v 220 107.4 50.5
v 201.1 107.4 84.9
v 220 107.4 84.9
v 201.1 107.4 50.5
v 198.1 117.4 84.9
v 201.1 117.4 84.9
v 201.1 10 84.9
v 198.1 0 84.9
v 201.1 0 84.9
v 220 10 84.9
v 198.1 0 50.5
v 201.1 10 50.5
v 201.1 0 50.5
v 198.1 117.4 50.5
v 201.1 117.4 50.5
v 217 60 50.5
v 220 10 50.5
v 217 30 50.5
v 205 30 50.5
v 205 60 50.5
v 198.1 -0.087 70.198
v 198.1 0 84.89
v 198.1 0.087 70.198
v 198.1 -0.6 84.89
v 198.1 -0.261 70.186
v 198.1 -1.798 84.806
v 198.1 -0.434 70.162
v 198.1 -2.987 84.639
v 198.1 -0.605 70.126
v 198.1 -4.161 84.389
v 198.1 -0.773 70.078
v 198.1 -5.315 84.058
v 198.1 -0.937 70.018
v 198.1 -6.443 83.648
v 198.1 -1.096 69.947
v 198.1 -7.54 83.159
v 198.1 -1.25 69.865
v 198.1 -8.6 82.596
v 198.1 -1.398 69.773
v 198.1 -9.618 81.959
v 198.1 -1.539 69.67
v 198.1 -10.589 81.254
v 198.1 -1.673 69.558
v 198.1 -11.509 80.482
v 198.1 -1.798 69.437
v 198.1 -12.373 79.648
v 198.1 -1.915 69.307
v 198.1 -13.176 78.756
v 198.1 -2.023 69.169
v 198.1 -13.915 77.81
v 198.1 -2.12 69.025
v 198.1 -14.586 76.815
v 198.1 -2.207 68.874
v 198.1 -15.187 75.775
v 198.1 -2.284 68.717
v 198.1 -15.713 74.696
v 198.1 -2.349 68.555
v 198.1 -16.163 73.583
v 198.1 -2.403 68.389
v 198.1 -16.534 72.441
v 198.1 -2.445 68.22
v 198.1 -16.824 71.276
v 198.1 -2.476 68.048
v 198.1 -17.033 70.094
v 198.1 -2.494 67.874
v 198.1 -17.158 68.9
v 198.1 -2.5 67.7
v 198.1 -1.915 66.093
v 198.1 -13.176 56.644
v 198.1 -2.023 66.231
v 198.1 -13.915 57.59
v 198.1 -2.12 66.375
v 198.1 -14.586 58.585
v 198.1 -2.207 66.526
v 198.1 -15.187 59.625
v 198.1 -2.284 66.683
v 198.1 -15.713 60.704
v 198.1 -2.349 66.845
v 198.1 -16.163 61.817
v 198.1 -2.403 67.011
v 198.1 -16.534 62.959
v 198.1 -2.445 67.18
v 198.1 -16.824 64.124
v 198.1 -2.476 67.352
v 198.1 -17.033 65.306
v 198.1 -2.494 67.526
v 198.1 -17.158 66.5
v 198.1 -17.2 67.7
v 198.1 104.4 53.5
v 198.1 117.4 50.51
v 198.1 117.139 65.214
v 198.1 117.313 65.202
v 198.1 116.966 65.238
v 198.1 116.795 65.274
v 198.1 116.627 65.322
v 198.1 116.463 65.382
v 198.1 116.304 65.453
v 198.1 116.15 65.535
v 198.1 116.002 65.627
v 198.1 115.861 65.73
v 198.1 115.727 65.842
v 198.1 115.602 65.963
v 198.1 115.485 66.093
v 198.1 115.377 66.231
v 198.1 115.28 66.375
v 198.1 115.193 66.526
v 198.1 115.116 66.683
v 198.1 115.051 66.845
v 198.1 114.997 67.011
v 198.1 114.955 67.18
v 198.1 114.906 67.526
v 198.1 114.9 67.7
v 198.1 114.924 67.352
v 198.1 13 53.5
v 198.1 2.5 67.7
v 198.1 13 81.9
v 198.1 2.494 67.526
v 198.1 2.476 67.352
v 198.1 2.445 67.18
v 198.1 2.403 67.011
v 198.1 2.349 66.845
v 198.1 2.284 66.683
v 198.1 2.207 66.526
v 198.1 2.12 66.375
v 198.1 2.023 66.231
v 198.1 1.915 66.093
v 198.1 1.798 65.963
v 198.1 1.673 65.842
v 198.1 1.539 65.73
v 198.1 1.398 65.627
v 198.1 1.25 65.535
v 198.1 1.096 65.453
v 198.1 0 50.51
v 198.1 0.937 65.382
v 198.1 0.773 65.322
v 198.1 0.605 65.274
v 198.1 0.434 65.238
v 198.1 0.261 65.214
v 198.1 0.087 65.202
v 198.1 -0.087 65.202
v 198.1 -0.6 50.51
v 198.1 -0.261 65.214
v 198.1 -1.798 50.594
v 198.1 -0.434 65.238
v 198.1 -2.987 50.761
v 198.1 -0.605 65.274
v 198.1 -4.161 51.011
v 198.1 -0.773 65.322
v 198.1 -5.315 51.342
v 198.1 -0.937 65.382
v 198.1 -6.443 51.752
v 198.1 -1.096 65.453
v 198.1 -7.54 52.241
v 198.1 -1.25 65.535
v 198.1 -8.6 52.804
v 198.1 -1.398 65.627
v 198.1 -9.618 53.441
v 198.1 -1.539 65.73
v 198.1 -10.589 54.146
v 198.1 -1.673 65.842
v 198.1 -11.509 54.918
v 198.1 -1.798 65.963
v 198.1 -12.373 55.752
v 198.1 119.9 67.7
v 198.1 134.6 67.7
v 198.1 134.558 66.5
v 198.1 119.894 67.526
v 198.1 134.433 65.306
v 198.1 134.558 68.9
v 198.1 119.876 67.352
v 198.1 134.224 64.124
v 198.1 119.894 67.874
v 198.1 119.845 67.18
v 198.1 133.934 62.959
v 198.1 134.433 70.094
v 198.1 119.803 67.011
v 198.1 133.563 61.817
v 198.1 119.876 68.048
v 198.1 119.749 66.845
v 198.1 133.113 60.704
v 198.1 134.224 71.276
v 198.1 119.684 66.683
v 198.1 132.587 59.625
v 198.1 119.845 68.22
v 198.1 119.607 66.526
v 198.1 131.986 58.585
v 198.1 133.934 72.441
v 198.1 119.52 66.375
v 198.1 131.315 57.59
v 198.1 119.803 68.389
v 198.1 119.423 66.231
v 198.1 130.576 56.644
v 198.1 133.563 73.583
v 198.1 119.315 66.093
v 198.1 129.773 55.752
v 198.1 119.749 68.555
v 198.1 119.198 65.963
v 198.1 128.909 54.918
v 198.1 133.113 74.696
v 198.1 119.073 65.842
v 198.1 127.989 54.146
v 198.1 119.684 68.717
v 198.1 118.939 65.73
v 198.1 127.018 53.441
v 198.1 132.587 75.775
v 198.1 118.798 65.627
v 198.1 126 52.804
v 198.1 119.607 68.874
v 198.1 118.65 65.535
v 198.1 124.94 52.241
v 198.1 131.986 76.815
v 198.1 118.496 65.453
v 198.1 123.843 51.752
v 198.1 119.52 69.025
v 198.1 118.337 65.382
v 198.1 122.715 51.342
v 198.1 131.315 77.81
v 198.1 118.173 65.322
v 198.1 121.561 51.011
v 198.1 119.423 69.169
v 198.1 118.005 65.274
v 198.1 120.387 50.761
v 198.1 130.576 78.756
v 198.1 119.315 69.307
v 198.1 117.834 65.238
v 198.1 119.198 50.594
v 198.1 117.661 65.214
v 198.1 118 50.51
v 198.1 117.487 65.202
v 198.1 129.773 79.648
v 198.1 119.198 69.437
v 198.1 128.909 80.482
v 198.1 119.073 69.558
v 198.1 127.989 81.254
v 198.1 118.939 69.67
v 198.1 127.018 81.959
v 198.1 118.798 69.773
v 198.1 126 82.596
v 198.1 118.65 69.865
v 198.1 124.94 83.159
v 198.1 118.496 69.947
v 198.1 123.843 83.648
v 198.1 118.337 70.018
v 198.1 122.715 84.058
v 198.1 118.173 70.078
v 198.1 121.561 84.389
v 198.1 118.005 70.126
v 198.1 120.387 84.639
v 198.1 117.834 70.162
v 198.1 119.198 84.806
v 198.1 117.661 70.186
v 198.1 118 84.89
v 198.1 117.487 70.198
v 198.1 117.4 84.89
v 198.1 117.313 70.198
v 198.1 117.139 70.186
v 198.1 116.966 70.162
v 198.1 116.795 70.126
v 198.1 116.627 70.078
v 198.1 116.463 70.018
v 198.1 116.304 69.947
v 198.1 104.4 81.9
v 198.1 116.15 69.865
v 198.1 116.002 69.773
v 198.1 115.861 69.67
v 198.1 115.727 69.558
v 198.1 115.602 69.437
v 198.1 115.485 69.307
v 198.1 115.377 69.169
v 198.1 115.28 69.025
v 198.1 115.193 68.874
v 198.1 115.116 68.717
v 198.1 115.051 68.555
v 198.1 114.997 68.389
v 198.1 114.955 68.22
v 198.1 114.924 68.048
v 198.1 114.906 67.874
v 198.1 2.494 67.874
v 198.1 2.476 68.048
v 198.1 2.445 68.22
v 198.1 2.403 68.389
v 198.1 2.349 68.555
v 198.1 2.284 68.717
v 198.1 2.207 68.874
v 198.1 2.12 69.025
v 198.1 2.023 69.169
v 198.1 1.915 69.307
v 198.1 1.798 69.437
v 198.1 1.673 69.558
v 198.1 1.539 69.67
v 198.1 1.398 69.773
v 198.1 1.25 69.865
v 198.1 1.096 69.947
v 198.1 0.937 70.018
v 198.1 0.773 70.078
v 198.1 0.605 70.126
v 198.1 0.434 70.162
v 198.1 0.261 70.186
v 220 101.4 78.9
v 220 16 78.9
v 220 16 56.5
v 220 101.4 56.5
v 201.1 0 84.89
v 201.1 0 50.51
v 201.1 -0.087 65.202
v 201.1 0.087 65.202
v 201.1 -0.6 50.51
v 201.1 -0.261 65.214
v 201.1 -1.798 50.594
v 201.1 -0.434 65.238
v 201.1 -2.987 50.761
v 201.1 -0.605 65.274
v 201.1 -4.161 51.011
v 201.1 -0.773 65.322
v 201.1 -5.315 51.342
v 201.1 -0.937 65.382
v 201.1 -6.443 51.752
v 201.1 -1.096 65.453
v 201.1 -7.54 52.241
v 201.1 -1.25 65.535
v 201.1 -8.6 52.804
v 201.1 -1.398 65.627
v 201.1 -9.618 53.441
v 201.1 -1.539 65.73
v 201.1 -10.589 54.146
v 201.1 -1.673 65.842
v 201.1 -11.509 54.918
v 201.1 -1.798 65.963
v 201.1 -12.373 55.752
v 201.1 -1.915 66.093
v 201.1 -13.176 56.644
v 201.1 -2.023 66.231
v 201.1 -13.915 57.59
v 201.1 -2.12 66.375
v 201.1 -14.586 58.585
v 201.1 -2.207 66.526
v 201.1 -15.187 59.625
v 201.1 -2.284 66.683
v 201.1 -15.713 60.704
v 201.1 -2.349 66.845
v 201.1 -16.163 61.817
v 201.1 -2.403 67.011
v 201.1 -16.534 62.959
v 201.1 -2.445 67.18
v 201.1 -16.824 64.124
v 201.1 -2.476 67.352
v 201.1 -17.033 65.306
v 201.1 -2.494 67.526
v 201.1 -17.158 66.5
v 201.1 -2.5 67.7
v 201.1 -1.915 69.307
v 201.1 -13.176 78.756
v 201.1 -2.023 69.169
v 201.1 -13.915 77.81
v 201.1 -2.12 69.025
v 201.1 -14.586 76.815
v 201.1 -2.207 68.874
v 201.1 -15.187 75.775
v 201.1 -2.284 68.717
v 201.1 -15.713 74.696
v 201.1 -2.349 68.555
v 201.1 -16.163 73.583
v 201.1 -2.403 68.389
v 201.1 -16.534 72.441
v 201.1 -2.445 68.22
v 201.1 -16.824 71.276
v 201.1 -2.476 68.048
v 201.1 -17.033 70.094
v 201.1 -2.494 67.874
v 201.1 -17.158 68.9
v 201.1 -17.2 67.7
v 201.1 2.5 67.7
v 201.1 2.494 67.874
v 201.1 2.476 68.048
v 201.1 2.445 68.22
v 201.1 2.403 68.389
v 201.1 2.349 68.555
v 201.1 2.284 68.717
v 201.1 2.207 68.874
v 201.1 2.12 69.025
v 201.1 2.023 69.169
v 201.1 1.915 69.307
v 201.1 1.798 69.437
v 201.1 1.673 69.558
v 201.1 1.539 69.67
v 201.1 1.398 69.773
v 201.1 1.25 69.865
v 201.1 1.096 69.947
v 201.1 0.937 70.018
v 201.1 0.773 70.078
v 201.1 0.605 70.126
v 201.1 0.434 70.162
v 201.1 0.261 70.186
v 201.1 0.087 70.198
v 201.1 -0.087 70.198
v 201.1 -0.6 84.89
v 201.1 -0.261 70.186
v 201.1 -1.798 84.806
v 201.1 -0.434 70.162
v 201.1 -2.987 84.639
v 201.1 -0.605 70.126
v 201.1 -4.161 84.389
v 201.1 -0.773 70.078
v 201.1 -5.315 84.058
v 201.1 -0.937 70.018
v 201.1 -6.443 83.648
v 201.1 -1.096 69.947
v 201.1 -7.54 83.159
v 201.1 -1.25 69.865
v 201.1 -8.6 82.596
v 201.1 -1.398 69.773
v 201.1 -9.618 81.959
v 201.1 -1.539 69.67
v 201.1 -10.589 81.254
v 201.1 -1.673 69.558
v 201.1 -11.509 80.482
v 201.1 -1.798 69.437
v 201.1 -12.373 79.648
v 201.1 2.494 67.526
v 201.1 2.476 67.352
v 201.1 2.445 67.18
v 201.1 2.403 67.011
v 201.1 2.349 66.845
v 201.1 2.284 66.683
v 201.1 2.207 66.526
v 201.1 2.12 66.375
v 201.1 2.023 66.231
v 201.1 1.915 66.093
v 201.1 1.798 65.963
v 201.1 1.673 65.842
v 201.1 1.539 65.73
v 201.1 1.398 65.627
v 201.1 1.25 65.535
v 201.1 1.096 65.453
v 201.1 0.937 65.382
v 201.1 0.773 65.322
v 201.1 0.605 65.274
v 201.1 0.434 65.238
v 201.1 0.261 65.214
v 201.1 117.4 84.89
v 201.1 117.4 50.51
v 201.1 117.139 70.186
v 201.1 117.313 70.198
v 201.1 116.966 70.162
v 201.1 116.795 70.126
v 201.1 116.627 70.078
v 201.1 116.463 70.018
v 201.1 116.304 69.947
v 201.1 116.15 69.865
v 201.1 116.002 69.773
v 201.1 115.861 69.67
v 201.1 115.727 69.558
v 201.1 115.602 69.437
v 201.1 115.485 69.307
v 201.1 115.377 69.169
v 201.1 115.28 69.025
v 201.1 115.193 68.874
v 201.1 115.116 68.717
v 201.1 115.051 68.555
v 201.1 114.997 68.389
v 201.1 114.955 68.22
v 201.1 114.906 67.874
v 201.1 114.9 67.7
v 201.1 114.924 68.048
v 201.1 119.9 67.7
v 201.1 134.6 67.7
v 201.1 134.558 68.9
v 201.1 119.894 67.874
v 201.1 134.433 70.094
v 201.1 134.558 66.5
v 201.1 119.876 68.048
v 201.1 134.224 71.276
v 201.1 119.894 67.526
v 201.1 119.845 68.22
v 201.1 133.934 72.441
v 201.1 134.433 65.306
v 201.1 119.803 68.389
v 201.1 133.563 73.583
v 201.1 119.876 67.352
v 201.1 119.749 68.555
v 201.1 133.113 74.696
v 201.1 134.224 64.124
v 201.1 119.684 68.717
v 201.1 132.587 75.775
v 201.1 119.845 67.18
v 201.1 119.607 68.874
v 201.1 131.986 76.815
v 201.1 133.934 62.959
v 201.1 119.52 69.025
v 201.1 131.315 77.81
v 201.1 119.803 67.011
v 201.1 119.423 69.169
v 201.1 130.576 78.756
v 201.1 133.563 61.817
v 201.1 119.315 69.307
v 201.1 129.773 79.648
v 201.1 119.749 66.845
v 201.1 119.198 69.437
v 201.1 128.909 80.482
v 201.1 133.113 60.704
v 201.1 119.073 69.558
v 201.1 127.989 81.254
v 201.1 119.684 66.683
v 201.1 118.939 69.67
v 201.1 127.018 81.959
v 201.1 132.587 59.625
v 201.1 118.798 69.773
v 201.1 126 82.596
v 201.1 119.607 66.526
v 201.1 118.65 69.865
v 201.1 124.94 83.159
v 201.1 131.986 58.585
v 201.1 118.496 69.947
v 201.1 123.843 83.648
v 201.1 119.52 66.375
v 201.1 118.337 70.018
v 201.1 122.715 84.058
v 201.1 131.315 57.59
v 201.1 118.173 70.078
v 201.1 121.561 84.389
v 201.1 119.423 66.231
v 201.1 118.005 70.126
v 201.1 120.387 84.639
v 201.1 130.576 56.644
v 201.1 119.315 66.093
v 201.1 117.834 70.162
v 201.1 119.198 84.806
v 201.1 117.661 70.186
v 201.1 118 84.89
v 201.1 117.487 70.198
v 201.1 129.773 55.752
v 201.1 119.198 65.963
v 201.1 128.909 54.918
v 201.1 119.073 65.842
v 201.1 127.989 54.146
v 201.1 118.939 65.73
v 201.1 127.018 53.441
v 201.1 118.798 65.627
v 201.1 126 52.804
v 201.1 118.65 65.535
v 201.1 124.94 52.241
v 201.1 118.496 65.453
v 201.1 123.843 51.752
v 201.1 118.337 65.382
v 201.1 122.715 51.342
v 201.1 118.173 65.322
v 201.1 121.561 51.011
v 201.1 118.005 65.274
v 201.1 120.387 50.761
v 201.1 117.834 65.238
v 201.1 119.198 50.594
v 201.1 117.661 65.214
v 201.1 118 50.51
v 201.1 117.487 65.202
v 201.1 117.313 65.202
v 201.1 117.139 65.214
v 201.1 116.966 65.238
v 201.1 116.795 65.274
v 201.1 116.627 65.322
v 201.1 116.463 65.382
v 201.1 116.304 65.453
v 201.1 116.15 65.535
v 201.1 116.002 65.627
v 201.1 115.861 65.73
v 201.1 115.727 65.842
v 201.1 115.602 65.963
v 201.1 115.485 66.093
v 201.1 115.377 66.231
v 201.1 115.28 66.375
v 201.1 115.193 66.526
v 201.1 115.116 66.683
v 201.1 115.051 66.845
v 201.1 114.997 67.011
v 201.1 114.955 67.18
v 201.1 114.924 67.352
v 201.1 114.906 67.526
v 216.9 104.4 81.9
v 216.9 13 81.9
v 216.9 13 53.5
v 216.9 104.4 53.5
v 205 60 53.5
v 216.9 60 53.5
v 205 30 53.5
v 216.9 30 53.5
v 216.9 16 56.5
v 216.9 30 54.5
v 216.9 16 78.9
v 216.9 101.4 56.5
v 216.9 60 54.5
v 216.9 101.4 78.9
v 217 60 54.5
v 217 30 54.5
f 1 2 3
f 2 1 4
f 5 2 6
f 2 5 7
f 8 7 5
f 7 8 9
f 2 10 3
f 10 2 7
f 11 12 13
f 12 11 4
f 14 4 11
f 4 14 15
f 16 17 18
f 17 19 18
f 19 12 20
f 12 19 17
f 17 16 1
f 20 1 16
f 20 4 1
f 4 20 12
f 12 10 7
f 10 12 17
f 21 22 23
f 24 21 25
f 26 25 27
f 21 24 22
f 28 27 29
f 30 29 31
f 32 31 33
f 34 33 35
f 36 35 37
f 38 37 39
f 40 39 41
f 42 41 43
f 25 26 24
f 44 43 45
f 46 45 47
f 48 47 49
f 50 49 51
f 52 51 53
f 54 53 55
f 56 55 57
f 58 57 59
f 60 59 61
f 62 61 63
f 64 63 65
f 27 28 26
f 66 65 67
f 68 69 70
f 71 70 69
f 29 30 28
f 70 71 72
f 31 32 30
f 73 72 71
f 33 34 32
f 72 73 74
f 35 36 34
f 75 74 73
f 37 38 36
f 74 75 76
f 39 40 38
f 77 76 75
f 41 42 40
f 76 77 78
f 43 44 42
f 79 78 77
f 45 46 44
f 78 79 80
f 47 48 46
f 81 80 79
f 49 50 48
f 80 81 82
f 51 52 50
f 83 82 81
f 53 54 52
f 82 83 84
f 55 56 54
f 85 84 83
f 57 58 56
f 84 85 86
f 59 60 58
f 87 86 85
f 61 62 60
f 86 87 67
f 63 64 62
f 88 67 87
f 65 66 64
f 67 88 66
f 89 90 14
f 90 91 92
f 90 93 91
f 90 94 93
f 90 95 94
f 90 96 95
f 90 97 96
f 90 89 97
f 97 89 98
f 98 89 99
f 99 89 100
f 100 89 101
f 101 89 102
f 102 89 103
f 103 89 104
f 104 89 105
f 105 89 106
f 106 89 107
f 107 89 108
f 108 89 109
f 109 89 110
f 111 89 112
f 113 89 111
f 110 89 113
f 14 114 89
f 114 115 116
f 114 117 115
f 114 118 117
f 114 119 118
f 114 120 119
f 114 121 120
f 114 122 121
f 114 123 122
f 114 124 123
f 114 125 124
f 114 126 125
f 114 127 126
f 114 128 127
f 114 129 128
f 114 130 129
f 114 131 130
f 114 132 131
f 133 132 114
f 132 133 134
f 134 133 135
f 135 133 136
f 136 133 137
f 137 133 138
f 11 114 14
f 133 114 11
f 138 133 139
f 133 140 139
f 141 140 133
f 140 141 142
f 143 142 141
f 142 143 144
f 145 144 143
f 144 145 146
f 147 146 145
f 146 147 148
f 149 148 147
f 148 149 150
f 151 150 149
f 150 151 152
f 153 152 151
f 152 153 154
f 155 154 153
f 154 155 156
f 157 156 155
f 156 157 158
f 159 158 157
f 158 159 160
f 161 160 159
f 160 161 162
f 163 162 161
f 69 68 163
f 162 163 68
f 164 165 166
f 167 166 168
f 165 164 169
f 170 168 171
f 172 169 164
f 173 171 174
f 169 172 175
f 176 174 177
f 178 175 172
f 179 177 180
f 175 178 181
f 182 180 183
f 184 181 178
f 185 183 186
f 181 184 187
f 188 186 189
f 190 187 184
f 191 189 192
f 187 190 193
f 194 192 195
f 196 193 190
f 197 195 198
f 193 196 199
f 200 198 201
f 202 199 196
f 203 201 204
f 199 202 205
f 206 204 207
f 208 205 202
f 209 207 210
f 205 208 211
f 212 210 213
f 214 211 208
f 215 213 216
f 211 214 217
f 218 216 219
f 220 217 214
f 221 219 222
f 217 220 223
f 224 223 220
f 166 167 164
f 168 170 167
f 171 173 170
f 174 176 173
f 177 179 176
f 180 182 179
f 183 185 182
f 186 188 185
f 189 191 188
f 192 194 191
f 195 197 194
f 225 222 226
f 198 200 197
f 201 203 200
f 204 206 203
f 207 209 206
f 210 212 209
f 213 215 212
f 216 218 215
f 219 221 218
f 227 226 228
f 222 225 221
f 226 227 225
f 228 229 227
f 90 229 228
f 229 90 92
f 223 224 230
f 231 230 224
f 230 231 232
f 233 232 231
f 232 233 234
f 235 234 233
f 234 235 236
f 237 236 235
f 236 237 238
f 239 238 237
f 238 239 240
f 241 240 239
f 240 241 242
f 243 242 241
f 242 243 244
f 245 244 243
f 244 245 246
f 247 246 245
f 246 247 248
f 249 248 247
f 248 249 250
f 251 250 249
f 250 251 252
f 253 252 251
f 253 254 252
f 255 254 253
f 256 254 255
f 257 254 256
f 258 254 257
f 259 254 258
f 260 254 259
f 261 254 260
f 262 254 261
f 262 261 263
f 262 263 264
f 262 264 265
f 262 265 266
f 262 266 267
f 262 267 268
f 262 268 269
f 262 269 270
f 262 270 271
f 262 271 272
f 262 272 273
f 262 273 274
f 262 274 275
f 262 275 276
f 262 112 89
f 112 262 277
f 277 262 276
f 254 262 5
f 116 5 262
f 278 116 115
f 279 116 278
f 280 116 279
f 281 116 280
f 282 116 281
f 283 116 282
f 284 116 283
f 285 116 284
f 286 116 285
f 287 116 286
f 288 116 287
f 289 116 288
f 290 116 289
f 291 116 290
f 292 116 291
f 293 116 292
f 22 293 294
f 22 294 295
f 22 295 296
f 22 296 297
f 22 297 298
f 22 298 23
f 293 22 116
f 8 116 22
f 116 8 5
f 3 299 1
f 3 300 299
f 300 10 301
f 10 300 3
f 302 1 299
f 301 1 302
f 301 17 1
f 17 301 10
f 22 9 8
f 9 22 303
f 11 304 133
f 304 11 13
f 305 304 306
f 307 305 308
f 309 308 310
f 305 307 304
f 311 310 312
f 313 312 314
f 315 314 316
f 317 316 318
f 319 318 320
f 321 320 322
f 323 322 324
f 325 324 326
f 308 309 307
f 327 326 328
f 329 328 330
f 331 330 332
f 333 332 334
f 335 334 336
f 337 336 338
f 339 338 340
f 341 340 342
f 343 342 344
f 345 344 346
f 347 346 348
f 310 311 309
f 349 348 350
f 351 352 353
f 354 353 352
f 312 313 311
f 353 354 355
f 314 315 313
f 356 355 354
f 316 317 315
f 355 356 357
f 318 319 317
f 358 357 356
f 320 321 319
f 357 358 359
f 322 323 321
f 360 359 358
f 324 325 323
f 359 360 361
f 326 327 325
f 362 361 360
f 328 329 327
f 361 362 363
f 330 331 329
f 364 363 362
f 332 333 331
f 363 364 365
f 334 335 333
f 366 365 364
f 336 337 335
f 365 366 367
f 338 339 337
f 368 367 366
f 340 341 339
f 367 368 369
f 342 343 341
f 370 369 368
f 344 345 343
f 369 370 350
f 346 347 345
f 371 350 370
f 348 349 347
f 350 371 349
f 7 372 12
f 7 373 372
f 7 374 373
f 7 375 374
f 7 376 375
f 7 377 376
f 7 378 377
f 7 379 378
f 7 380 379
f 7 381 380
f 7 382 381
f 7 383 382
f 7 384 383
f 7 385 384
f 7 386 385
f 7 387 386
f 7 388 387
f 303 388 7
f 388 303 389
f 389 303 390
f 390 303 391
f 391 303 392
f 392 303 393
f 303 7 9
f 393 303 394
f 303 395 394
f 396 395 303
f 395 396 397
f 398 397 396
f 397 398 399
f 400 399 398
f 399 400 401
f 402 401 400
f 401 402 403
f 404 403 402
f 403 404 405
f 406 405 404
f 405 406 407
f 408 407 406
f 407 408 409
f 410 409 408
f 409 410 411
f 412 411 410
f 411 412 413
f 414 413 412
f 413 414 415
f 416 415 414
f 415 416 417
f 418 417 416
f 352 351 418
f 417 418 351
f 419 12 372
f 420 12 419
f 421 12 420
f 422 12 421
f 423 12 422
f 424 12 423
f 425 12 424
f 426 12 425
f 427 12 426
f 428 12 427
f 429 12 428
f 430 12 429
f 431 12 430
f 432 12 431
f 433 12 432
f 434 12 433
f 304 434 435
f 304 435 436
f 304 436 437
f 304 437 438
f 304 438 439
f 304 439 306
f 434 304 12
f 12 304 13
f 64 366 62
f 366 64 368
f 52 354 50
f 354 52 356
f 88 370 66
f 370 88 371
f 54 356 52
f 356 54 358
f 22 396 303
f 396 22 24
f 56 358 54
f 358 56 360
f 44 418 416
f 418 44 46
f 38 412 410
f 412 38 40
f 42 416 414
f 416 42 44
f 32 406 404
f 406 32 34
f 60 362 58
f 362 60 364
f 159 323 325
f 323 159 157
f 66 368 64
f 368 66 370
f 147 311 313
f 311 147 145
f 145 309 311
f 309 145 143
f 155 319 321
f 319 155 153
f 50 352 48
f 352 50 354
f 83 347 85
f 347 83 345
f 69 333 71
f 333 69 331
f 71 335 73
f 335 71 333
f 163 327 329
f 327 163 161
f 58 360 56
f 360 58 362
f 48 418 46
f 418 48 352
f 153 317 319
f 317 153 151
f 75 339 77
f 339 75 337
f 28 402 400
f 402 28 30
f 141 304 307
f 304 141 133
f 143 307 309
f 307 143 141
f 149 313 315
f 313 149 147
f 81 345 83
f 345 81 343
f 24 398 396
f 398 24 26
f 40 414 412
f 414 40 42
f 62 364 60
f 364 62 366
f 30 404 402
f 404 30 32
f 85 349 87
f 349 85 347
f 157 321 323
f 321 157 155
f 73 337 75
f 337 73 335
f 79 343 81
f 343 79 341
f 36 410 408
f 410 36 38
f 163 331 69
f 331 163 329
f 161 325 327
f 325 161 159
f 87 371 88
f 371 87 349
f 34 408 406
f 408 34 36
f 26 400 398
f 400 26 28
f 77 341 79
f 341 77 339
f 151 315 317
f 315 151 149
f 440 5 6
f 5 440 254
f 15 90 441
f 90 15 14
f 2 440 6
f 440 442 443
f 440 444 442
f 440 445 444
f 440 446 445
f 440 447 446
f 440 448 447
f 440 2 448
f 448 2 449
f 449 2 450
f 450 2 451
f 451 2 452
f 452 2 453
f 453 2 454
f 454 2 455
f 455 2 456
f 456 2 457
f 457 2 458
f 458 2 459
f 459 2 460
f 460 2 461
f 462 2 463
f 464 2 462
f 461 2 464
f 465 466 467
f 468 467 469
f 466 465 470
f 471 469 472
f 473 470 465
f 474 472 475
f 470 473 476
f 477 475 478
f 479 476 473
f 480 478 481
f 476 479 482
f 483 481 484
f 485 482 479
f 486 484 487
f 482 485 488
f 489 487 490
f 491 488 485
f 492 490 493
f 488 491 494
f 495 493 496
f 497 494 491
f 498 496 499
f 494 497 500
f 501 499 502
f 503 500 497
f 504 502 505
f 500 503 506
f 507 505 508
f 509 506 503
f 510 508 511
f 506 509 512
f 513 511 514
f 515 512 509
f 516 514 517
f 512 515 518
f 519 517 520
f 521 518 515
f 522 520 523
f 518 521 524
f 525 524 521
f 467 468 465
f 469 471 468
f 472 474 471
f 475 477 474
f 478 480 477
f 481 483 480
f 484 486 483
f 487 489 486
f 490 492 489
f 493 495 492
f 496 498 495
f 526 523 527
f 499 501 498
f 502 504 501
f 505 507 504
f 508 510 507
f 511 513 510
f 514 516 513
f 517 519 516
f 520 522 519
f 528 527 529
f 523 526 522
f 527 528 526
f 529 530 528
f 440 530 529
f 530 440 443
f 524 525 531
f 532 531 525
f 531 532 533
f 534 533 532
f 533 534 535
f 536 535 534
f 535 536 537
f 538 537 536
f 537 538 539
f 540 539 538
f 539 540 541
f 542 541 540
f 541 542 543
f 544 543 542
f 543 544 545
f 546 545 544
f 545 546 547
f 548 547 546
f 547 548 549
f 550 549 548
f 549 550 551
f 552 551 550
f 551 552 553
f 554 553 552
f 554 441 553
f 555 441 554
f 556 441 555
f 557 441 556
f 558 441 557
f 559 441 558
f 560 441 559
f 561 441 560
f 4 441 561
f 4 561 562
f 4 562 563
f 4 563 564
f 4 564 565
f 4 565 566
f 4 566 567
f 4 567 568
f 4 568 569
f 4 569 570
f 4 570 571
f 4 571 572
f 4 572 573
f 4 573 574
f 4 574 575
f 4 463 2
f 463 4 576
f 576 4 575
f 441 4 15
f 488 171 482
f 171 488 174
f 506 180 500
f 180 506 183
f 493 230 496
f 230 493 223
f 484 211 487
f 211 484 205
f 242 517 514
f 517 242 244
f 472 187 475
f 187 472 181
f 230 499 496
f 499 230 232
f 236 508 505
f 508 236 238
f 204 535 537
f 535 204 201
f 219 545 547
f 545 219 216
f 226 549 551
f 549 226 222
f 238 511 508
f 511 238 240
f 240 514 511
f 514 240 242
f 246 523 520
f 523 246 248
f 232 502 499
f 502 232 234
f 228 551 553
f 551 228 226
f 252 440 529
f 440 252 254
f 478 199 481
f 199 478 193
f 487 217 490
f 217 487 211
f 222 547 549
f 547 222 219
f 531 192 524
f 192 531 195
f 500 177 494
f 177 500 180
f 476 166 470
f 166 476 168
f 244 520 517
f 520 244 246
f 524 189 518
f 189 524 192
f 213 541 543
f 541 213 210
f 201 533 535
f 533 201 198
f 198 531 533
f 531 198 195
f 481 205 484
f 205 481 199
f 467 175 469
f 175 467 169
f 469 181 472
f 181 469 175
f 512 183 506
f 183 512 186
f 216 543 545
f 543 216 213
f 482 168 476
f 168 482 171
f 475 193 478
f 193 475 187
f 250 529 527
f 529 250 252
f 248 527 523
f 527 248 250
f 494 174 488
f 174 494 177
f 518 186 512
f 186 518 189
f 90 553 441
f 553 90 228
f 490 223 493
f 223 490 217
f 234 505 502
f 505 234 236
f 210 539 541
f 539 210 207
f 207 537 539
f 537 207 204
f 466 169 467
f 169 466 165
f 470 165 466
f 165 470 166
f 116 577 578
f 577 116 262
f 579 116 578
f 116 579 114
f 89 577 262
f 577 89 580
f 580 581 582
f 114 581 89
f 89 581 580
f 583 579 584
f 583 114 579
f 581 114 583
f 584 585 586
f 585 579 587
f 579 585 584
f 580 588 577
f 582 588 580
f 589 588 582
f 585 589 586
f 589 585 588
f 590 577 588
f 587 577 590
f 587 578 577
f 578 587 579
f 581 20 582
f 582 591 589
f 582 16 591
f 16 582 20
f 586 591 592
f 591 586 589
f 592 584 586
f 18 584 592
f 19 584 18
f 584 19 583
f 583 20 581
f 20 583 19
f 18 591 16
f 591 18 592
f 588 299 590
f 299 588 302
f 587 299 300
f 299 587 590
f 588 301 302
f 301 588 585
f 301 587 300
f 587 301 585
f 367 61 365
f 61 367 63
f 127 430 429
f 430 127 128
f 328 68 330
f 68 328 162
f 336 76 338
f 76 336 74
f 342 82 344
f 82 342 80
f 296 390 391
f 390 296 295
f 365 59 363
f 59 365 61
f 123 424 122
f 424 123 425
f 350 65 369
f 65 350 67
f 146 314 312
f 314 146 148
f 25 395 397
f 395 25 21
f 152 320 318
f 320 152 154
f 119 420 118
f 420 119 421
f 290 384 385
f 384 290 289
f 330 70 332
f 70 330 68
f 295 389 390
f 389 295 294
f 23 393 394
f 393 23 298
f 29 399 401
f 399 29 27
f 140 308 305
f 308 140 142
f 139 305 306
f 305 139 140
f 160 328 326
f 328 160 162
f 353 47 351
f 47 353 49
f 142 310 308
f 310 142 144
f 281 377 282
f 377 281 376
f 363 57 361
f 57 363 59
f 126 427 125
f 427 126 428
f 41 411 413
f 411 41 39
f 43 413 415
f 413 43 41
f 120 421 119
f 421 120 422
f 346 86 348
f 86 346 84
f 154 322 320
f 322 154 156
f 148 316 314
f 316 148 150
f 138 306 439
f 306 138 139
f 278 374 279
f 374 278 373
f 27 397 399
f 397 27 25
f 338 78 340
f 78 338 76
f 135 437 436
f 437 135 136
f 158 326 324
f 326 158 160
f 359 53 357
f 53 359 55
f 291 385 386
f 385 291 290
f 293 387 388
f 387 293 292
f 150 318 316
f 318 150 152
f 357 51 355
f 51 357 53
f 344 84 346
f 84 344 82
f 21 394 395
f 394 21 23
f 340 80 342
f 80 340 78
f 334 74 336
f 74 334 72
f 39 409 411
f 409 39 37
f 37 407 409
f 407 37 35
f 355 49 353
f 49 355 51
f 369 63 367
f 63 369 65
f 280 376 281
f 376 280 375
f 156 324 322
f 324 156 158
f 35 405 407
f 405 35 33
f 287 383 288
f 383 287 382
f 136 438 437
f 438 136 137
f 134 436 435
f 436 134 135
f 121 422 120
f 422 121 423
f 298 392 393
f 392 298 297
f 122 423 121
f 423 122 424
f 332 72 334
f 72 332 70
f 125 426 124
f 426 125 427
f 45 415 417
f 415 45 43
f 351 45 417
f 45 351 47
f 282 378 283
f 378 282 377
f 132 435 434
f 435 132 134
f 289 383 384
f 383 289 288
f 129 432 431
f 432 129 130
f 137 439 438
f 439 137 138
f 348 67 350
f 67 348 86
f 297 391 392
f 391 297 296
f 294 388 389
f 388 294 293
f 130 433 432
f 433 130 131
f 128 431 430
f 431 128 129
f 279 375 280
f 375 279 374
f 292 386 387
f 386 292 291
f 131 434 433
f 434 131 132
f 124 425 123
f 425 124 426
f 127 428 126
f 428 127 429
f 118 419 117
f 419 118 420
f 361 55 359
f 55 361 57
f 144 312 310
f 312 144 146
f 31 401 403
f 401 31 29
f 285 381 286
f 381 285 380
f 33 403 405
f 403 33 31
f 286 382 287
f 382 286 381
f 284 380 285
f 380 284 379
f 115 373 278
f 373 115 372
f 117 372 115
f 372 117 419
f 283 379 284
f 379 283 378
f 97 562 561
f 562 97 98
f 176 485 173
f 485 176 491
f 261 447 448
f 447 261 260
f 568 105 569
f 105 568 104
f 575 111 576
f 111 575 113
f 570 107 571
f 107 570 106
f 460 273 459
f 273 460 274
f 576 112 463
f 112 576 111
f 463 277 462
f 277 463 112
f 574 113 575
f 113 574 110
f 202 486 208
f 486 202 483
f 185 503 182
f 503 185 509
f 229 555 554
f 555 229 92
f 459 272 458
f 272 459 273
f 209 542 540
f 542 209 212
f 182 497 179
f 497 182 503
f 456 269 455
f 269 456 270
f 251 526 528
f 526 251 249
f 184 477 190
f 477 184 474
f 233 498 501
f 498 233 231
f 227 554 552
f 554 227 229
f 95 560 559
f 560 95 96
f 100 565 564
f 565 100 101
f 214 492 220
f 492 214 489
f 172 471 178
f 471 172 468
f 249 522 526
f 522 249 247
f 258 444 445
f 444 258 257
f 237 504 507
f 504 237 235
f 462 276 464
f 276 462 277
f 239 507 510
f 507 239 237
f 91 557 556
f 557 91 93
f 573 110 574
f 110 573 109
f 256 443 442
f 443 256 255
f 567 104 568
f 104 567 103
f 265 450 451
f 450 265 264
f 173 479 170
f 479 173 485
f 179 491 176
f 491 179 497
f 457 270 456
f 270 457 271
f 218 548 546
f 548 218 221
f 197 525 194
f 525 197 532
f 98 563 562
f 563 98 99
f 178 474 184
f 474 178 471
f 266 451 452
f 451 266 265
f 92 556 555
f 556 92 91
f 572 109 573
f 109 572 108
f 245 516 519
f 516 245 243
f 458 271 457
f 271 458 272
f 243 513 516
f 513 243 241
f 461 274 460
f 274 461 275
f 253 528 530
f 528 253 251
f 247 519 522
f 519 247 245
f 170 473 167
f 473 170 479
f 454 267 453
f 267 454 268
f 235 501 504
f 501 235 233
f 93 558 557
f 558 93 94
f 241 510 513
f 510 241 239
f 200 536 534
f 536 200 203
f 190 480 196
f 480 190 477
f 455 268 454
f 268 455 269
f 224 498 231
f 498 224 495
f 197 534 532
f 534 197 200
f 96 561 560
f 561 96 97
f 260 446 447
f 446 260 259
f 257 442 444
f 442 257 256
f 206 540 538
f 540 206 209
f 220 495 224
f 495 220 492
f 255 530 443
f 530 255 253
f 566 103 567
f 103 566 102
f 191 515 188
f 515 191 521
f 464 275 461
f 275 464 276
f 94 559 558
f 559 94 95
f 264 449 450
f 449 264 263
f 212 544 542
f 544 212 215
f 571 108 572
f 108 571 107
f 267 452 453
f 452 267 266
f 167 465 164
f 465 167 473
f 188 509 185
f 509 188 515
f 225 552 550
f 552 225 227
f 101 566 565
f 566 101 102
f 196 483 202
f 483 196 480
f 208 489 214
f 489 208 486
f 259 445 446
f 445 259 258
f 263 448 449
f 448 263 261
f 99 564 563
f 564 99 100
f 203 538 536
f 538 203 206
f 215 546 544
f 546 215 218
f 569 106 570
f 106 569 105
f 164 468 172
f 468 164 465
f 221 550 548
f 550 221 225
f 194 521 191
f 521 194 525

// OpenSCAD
length = 190;
width = 120;

level2Diameter = 210;

wallThickness = 5;
height = 22.5;
motorWidth = 15;
halfHeight = height /2;

axelBore = 10;
holeDistance = 20;
boreOffset = 12;
fixingOffset = 2.25;
fixingBore = 3;
fixingTop = height-fixingOffset;
reverseFixings = holeDistance + boreOffset;
wireHoleOffset = 40;
wireHoleBoreLength = 25;
wireHoleBoreHeight = 17;
wireHoleBoreHeightStart = (height - wireHoleBoreHeight) / 2;

batteryLength = 151;
batteryWidth = 51;
batteryHeight = 93;

boxHeight = wallThickness + (height * 2);

wheelDiameter = 70;
wheelWidth = 35;

midX=length / 2;
midY=width / 2;

startX = (length - batteryLength) / 2;
startY = (width - batteryWidth) / 2;


module level5() {
    layerHeight =18;
    offsetUp = 25+layerHeight+wallThickness;
    i2cMuxWidth=45;
    i2cMuxLength=81;
    
    lightSensorSpacing=8.5;
    
    powerMonitorWidth=18;
    powerMonitorLength=31.5;
    
    batteryChargerWidth=31.5;
    batteryChargerLength=61.3;
    
    
    difference(){
        union(){
            translate([0,0,boxHeight + wallThickness + offsetUp]) cube([length, width, wallThickness/2]);
            
            translate([(length/2)-80, 5, boxHeight + wallThickness + offsetUp-layerHeight]) 
                cylinder(d=10, h=layerHeight, $fn=90);
            translate([(length/2)-80, width-5, boxHeight + wallThickness + offsetUp-layerHeight]) 
                cylinder(d=10, h=layerHeight, $fn=90);
            translate([(length/2)+80, 5, boxHeight + wallThickness + offsetUp-layerHeight]) 
                cylinder(d=10, h=layerHeight, $fn=90);
            translate([(length/2)+80, width-5, boxHeight + wallThickness + offsetUp-layerHeight]) 
                cylinder(d=10, h=layerHeight, $fn=90);
            translate([(length/2)+30, width-5, boxHeight + wallThickness + offsetUp-layerHeight]) 
                cylinder(d=10, h=layerHeight, $fn=90);
            
            translate([length-80,width-wallThickness,boxHeight + wallThickness + offsetUp - layerHeight]) cube([80, wallThickness, layerHeight]);
            translate([length-wallThickness,width-wallThickness-20,boxHeight + wallThickness + offsetUp - layerHeight]) cube([wallThickness, 20, layerHeight]);
            translate([length-80,width-wallThickness-10,boxHeight + wallThickness + offsetUp - layerHeight]) cube([wallThickness, 10, layerHeight]);
            
        }
        union(){
            fixingHoles();
            
            // i2cMux Mounting
            translate([10, midY-(i2cMuxLength/2), boxHeight + wallThickness + offsetUp-layerHeight]) cylinder(d=2.5, h=50, $fn=90);
            translate([10, midY+(i2cMuxLength/2), boxHeight + wallThickness + offsetUp-layerHeight]) cylinder(d=2.5, h=50, $fn=90);
            translate([10+(i2cMuxWidth), midY-(i2cMuxLength/2), boxHeight + wallThickness + offsetUp-layerHeight]) cylinder(d=2.5, h=50, $fn=90);
            translate([10+(i2cMuxWidth), midY+(i2cMuxLength/2), boxHeight + wallThickness + offsetUp-layerHeight]) cylinder(d=2.5, h=50, $fn=90);
            
            // lightSensor S
            translate([5, midY-(lightSensorSpacing/2), boxHeight + wallThickness + offsetUp-layerHeight]) cylinder(d=5, h=50, $fn=90);
            translate([5, midY+(lightSensorSpacing/2), boxHeight + wallThickness + offsetUp-layerHeight]) cylinder(d=5, h=50, $fn=90);
            
            // lightSensor N
            translate([length-5, midY-(lightSensorSpacing/2), boxHeight + wallThickness + offsetUp-layerHeight]) 
                cylinder(d=5, h=50, $fn=90);
            translate([length-5, midY+(lightSensorSpacing/2), boxHeight + wallThickness + offsetUp-layerHeight])
                cylinder(d=5, h=50, $fn=90);
            
            // lightSensor E
            translate([midX-(lightSensorSpacing/2), 5, boxHeight + wallThickness + offsetUp-layerHeight]) 
                cylinder(d=5, h=50, $fn=90);
            translate([midX+(lightSensorSpacing/2), 5, boxHeight + wallThickness + offsetUp-layerHeight]) 
                cylinder(d=5, h=50, $fn=90);
            
            // lightSensor W
            translate([midX-(lightSensorSpacing/2), width-5, boxHeight + wallThickness + offsetUp-layerHeight]) cylinder(d=5, h=50, $fn=90);
            translate([midX+(lightSensorSpacing/2), width-5, boxHeight + wallThickness + offsetUp-layerHeight]) cylinder(d=5, h=50, $fn=90);
            
            // powerMonitor
            translate([length-20, midY-(powerMonitorLength/2), boxHeight + wallThickness + offsetUp-layerHeight]) cylinder(d=2.5, h=50, $fn=90);
            translate([length-20, midY+(powerMonitorLength/2), boxHeight + wallThickness + offsetUp-layerHeight]) cylinder(d=2.5, h=50, $fn=90);
            translate([length-20-(powerMonitorWidth), midY-(powerMonitorLength/2), boxHeight + wallThickness + offsetUp-layerHeight]) cylinder(d=2.5, h=50, $fn=90);
            translate([length-20-(powerMonitorWidth), midY+(powerMonitorLength/2), boxHeight + wallThickness + offsetUp-layerHeight]) cylinder(d=2.5, h=50, $fn=90);
            
            // batteryCharger
            translate([midX-(batteryChargerWidth/2), midY-(batteryChargerLength/2), boxHeight + wallThickness + offsetUp-layerHeight]) cylinder(d=2.5, h=50, $fn=90);
            translate([midX+(batteryChargerWidth/2), midY-(batteryChargerLength/2), boxHeight + wallThickness + offsetUp-layerHeight]) cylinder(d=2.5, h=50, $fn=90);
            
            translate([midX-(batteryChargerWidth/2), midY+(batteryChargerLength/2), boxHeight + wallThickness + offsetUp-layerHeight]) cube([batteryChargerWidth, 10, 50]);
            
            // Cable Slot 1
            slotWidth = batteryChargerWidth * 2.2;
            translate([59, midY-(slotWidth/2), boxHeight + wallThickness + offsetUp-layerHeight]) cube([12, slotWidth, 100]);
            
            // Cable Slot 2
            translate([length-60, midY-(batteryChargerWidth/2), boxHeight + wallThickness + offsetUp-layerHeight]) cube([10, batteryChargerWidth, 100]);
            
            // GPS Mount
            translate([length-10,20, boxHeight + wallThickness + offsetUp-layerHeight]) cylinder(d=6.4, h=20, $fn=90);
            
            // Switch 
            translate([length-40,width-wallThickness-1,boxHeight + wallThickness + offsetUp - layerHeight + 9]) rotate([0,90,90]) cylinder(d=12, h=10, $fn=90);
        }
    }
}

module level4() {   
    offsetUp = 25;
    difference(){
        union(){
            translate([0,0,boxHeight + wallThickness + offsetUp]) cube([length, width, wallThickness]);
            translate([midX,midY, boxHeight+wallThickness + offsetUp]) cylinder(d=level2Diameter*0.7, h=wallThickness, $fn=90);
            translate([startX - 5, startY - 5, boxHeight + wallThickness+wallThickness+wallThickness]) cube([batteryLength+10, batteryWidth+10, offsetUp-wallThickness]);
        }
        union(){
            translate([5, motorWidth + wallThickness, boxHeight-10+offsetUp]) cylinder(d=5, h=boxHeight, $fn=90);
            translate([5, width - (motorWidth + wallThickness), boxHeight-10+offsetUp]) cylinder(d=5, h=boxHeight, $fn=90);
            translate([length-5, motorWidth + wallThickness, boxHeight-10+offsetUp]) cylinder(d=5, h=boxHeight, $fn=90);
            translate([length-5, width - (motorWidth + wallThickness), boxHeight-10+offsetUp]) cylinder(d=5, h=boxHeight, $fn=90);
            battery();
            fixingHoles();
        }
    }
    cameraBracket();
}

module level3() {   
    offsetUp = 0;
    difference(){
        union(){
            translate([0,0,boxHeight + wallThickness + offsetUp]) cube([length, width, wallThickness]);
            translate([midX,midY, boxHeight+wallThickness + offsetUp]) cylinder(d=level2Diameter*0.9, h=wallThickness, $fn=90);
            translate([startX - 5, startY - 5, boxHeight + wallThickness + offsetUp]) cube([batteryLength+10, batteryWidth+10, 20]);
        }
        union(){
            translate([5, motorWidth + wallThickness, boxHeight-10+offsetUp]) cylinder(d=5, h=boxHeight, $fn=90);
            translate([5, width - (motorWidth + wallThickness), boxHeight-10+offsetUp]) cylinder(d=5, h=boxHeight, $fn=90);
            translate([length-5, motorWidth + wallThickness, boxHeight-10+offsetUp]) cylinder(d=5, h=boxHeight, $fn=90);
            translate([length-5, width - (motorWidth + wallThickness), boxHeight-10+offsetUp]) cylinder(d=5, h=boxHeight, $fn=90);
            battery();
            fixingHoles();
        }
    }
}

module battery() {
    translate([startX, startY, wallThickness]) color([0,0,0]) cube([batteryLength, batteryWidth, batteryHeight]);
}


module level2() {

    difference(){
        union(){
            translate([midX,midY, height+wallThickness]) cylinder(d=level2Diameter, h=wallThickness, $fn=90);
            translate([0,0,wallThickness+height]) cube([length, width, wallThickness]);
        }
        union(){
            fixingHoles();
            battery();
        }
    }
}

module base(){
    difference(){
        union(){    
            translate([midX,midY, 0]) cylinder(d=level2Diameter, h=wallThickness, $fn=90);        
            translate([0,0,0]) cube([length, width, wallThickness]);
            translate([startX - 5, startY - 5, wallThickness]) cube([batteryLength+10, batteryWidth+10, 10]);
            translate([0, motorWidth, 0]) cube([length, wallThickness, height+wallThickness]);
            translate([0, width-motorWidth-wallThickness, 0]) cube([length, wallThickness, height+wallThickness]);
            
            
            translate([5, motorWidth + wallThickness, wallThickness]) cylinder(d=10, h=height, $fn=90);
            translate([5, width - (motorWidth + wallThickness), wallThickness]) cylinder(d=10, h=height, $fn=90);
            translate([length-5, motorWidth + wallThickness, wallThickness]) cylinder(d=10, h=height, $fn=90);
            translate([length-5, width - (motorWidth + wallThickness), wallThickness]) cylinder(d=10, h=height, $fn=90);
            
        }
        union(){
            translate([boreOffset, 0, 0 + wallThickness + halfHeight]) rotate([0,90,90]) cylinder(d=axelBore, h=width, $fn=90);
            translate([boreOffset + holeDistance, 0, 0 + wallThickness + fixingOffset ]) rotate([0,90,90]) cylinder(d=fixingBore, h=width, $fn=90);
            translate([boreOffset + holeDistance, 0, 0 + wallThickness + fixingTop ]) rotate([0,90,90]) cylinder(d=fixingBore, h=width, $fn=90);
            translate([wireHoleOffset, 0, wallThickness + wireHoleBoreHeightStart]) cube([wireHoleBoreLength, width, wireHoleBoreHeight+5]);
            
            translate([length-boreOffset, 0, 0 + wallThickness + halfHeight]) rotate([0,90,90]) cylinder(d=axelBore, h=width, $fn=90);
            translate([length-reverseFixings, 0, 0 + wallThickness + fixingOffset ]) rotate([0,90,90]) cylinder(d=fixingBore, h=width, $fn=90);
            translate([length-reverseFixings, 0, 0 + wallThickness + fixingTop ]) rotate([0,90,90]) cylinder(d=fixingBore, h=width, $fn=90);
            translate([length-wireHoleOffset-wireHoleBoreLength, 0, wallThickness + wireHoleBoreHeightStart]) cube([wireHoleBoreLength, width, wireHoleBoreHeight+5]);
            battery();
            

            
            fixingHoles();
        }
    }
}

module fixingHoles() {
    layerHeight = 120;
    translate([5, (width/2) - 20, -1]) cylinder(d=5, h=layerHeight, $fn=90);
    translate([5, (width/2) + 20, -1]) cylinder(d=5, h=layerHeight, $fn=90);
    
    translate([length-5, (width/2) - 20, -1]) cylinder(d=5, h=layerHeight, $fn=90);
    translate([length-5, (width/2) + 20, -1]) cylinder(d=5, h=layerHeight, $fn=90);
    
    // Side holes
    translate([(length/2)-80, 5, -1]) cylinder(d=5, h=layerHeight, $fn=90);
    translate([(length/2)-80, width-5, -1]) cylinder(d=5, h=layerHeight, $fn=90);
    translate([(length/2)+80, 5, -1]) cylinder(d=5, h=layerHeight, $fn=90);
    translate([(length/2)+80, width-5, -1]) cylinder(d=5, h=layerHeight, $fn=90);
    
    translate([(length/2)+30, 5, -1]) cylinder(d=5, h=layerHeight, $fn=90);
    translate([(length/2)+30, width-5, -1]) cylinder(d=5, h=layerHeight, $fn=90);
    translate([(length/2)-30, 5, -1]) cylinder(d=5, h=layerHeight, $fn=90);
    translate([(length/2)-30, width-5, -1]) cylinder(d=5, h=layerHeight, $fn=90);
    
    translate([(length/2)+30, -25, -1]) cylinder(d=5, h=layerHeight, $fn=90);
    translate([(length/2)+30, width+25, -1]) cylinder(d=5, h=layerHeight, $fn=90);
    translate([(length/2)-30, -25, -1]) cylinder(d=5, h=layerHeight, $fn=90);
    translate([(length/2)-30, width+25, -1]) cylinder(d=5, h=layerHeight, $fn=90);
    
    translate([(length/2)+30, 25, -1]) cylinder(d=12, h=layerHeight, $fn=90);
    translate([(length/2)+30, width-25, -1]) cylinder(d=12, h=layerHeight, $fn=90);
    translate([(length/2)-30, 25, -1]) cylinder(d=12, h=layerHeight, $fn=90);
    translate([(length/2)-30, width-25, -1]) cylinder(d=12, h=layerHeight, $fn=90);
    
    translate([5, motorWidth + wallThickness, height-10]) cylinder(d=5, h=boxHeight, $fn=90);
    translate([5, width - (motorWidth + wallThickness), height-10]) cylinder(d=5, h=boxHeight, $fn=90);
    translate([length-5, motorWidth + wallThickness, height-10]) cylinder(d=5, h=boxHeight, $fn=90);
    translate([length-5, width - (motorWidth + wallThickness), height-10]) cylinder(d=5, h=boxHeight, $fn=90);
    
    wheels();

}

module wheels() {
    translate([boreOffset, 0, wallThickness + halfHeight]) rotate([0,90,270]) cylinder(d=wheelDiameter, h=wheelWidth, $fn=90);
    translate([length - boreOffset, 0, wallThickness + halfHeight]) rotate([0,90,270]) cylinder(d=wheelDiameter, h=wheelWidth, $fn=90);
    
    translate([boreOffset, width+wheelWidth, wallThickness + halfHeight]) rotate([0,90,270]) cylinder(d=wheelDiameter, h=wheelWidth, $fn=90);
    translate([length - boreOffset, width+wheelWidth, wallThickness + halfHeight]) rotate([0,90,270]) cylinder(d=wheelDiameter, h=wheelWidth, $fn=90);
}

module temp(){
    difference(){
        union(){
        }
        union(){
        }
    }
}


tolerance=0.4;

camLength=91 + tolerance;
camHeight=28 + tolerance;
camWidth=18.5 + tolerance;
camUsbHoleLength = 30; // 25 to 45
camUsbHoleWidth = 12; // 3 to 15

camBoxWallThickness = 3;
twoWalls = camBoxWallThickness * 2;

camBoxLength = camLength + twoWalls;
camBoxWidth = camWidth + camBoxWallThickness;
camBoxHeight = camHeight + twoWalls;

module camera() {
    difference() {
        union(){
            translate([0,0,0]) cube([camLength, camWidth, camHeight]);
        }
        union(){
        }
    }
}

module cameraHolder() {
    difference() {
        union(){
            translate([0,0,0]) cube([camBoxLength, camBoxWidth, camBoxHeight]);
            translate([-10,camBoxWidth - camBoxWallThickness, 0]) cube([10, camBoxWallThickness, camBoxHeight]);
            translate([-10,camBoxWidth - camBoxWallThickness, camBoxHeight / 2]) rotate([90,0,180]) cylinder(d=camBoxHeight, h=camBoxWallThickness, $fn=90);            
            
            translate([camBoxLength,camBoxWidth - camBoxWallThickness, 0]) cube([10, camBoxWallThickness, camBoxHeight]);
            translate([camBoxLength+10,camBoxWidth - camBoxWallThickness, camBoxHeight / 2]) rotate([90,0,180]) cylinder(d=camBoxHeight, h=camBoxWallThickness, $fn=90);
         
        }
        union(){
            translate([camBoxWallThickness, camBoxWallThickness+0.1, camBoxWallThickness]) camera();
            
//            translate([twoWalls*2, twoWalls, -1]) cube([camLength - (twoWalls * 3), camWidth, 5]);
            
            translate([20, 3, -1]) cube([camUsbHoleLength, camUsbHoleWidth, 5]);
            
            translate([twoWalls, -1,twoWalls]) cube([camLength - twoWalls, camWidth*2, camHeight - twoWalls]);
            translate([-10,camBoxWidth - camBoxWallThickness-1, camBoxHeight / 2]) rotate([90,0,180]) cylinder(d=5, h=camBoxWallThickness+2, $fn=90); 
            translate([camBoxLength+10,camBoxWidth - camBoxWallThickness-1, camBoxHeight / 2]) rotate([90,0,180]) cylinder(d=5, h=wallThickness+2, $fn=90);
            
            
        }
    }
}

module cameraBracket() {
    offsetUp=25;
    difference(){
        union(){
            translate([length, -17, boxHeight + wallThickness + offsetUp - (camBoxHeight-5) + wallThickness]) cube([wallThickness, width+31, camBoxHeight-5]);
            translate([length, 0, boxHeight + wallThickness + offsetUp])
              rotate([0,90,90])
              cylinder(r=wallThickness, h=wallThickness, $fn=90);
            translate([length, width-wallThickness, boxHeight + wallThickness + offsetUp])
              rotate([0,90,90])
              cylinder(r=wallThickness, h=wallThickness, $fn=90);
            translate([length, (width/2)-(wallThickness/2), boxHeight + wallThickness + offsetUp])
              rotate([0,90,90])
              cylinder(r=wallThickness, h=wallThickness, $fn=90);
            
        }
        union(){
            translate([length-1, 0, height+wallThickness +17.4+height]) rotate([0,90,0]) cylinder(d=6, h=wallThickness+2, $fn=90);
            translate([length-1, width-2.5, height+wallThickness +17.4+height]) rotate([0,90,0]) cylinder(d=6, h=wallThickness+2, $fn=90);
            fixingHoles();
            battery();
        }
    }
}


//base();
//level2();
//level3();
//level4();
//level5();
//battery();
//wheels();

translate([length+30,10,height+wallThickness + 23]) rotate([0,0,90]) color([0,1,0]) cameraHolder();
